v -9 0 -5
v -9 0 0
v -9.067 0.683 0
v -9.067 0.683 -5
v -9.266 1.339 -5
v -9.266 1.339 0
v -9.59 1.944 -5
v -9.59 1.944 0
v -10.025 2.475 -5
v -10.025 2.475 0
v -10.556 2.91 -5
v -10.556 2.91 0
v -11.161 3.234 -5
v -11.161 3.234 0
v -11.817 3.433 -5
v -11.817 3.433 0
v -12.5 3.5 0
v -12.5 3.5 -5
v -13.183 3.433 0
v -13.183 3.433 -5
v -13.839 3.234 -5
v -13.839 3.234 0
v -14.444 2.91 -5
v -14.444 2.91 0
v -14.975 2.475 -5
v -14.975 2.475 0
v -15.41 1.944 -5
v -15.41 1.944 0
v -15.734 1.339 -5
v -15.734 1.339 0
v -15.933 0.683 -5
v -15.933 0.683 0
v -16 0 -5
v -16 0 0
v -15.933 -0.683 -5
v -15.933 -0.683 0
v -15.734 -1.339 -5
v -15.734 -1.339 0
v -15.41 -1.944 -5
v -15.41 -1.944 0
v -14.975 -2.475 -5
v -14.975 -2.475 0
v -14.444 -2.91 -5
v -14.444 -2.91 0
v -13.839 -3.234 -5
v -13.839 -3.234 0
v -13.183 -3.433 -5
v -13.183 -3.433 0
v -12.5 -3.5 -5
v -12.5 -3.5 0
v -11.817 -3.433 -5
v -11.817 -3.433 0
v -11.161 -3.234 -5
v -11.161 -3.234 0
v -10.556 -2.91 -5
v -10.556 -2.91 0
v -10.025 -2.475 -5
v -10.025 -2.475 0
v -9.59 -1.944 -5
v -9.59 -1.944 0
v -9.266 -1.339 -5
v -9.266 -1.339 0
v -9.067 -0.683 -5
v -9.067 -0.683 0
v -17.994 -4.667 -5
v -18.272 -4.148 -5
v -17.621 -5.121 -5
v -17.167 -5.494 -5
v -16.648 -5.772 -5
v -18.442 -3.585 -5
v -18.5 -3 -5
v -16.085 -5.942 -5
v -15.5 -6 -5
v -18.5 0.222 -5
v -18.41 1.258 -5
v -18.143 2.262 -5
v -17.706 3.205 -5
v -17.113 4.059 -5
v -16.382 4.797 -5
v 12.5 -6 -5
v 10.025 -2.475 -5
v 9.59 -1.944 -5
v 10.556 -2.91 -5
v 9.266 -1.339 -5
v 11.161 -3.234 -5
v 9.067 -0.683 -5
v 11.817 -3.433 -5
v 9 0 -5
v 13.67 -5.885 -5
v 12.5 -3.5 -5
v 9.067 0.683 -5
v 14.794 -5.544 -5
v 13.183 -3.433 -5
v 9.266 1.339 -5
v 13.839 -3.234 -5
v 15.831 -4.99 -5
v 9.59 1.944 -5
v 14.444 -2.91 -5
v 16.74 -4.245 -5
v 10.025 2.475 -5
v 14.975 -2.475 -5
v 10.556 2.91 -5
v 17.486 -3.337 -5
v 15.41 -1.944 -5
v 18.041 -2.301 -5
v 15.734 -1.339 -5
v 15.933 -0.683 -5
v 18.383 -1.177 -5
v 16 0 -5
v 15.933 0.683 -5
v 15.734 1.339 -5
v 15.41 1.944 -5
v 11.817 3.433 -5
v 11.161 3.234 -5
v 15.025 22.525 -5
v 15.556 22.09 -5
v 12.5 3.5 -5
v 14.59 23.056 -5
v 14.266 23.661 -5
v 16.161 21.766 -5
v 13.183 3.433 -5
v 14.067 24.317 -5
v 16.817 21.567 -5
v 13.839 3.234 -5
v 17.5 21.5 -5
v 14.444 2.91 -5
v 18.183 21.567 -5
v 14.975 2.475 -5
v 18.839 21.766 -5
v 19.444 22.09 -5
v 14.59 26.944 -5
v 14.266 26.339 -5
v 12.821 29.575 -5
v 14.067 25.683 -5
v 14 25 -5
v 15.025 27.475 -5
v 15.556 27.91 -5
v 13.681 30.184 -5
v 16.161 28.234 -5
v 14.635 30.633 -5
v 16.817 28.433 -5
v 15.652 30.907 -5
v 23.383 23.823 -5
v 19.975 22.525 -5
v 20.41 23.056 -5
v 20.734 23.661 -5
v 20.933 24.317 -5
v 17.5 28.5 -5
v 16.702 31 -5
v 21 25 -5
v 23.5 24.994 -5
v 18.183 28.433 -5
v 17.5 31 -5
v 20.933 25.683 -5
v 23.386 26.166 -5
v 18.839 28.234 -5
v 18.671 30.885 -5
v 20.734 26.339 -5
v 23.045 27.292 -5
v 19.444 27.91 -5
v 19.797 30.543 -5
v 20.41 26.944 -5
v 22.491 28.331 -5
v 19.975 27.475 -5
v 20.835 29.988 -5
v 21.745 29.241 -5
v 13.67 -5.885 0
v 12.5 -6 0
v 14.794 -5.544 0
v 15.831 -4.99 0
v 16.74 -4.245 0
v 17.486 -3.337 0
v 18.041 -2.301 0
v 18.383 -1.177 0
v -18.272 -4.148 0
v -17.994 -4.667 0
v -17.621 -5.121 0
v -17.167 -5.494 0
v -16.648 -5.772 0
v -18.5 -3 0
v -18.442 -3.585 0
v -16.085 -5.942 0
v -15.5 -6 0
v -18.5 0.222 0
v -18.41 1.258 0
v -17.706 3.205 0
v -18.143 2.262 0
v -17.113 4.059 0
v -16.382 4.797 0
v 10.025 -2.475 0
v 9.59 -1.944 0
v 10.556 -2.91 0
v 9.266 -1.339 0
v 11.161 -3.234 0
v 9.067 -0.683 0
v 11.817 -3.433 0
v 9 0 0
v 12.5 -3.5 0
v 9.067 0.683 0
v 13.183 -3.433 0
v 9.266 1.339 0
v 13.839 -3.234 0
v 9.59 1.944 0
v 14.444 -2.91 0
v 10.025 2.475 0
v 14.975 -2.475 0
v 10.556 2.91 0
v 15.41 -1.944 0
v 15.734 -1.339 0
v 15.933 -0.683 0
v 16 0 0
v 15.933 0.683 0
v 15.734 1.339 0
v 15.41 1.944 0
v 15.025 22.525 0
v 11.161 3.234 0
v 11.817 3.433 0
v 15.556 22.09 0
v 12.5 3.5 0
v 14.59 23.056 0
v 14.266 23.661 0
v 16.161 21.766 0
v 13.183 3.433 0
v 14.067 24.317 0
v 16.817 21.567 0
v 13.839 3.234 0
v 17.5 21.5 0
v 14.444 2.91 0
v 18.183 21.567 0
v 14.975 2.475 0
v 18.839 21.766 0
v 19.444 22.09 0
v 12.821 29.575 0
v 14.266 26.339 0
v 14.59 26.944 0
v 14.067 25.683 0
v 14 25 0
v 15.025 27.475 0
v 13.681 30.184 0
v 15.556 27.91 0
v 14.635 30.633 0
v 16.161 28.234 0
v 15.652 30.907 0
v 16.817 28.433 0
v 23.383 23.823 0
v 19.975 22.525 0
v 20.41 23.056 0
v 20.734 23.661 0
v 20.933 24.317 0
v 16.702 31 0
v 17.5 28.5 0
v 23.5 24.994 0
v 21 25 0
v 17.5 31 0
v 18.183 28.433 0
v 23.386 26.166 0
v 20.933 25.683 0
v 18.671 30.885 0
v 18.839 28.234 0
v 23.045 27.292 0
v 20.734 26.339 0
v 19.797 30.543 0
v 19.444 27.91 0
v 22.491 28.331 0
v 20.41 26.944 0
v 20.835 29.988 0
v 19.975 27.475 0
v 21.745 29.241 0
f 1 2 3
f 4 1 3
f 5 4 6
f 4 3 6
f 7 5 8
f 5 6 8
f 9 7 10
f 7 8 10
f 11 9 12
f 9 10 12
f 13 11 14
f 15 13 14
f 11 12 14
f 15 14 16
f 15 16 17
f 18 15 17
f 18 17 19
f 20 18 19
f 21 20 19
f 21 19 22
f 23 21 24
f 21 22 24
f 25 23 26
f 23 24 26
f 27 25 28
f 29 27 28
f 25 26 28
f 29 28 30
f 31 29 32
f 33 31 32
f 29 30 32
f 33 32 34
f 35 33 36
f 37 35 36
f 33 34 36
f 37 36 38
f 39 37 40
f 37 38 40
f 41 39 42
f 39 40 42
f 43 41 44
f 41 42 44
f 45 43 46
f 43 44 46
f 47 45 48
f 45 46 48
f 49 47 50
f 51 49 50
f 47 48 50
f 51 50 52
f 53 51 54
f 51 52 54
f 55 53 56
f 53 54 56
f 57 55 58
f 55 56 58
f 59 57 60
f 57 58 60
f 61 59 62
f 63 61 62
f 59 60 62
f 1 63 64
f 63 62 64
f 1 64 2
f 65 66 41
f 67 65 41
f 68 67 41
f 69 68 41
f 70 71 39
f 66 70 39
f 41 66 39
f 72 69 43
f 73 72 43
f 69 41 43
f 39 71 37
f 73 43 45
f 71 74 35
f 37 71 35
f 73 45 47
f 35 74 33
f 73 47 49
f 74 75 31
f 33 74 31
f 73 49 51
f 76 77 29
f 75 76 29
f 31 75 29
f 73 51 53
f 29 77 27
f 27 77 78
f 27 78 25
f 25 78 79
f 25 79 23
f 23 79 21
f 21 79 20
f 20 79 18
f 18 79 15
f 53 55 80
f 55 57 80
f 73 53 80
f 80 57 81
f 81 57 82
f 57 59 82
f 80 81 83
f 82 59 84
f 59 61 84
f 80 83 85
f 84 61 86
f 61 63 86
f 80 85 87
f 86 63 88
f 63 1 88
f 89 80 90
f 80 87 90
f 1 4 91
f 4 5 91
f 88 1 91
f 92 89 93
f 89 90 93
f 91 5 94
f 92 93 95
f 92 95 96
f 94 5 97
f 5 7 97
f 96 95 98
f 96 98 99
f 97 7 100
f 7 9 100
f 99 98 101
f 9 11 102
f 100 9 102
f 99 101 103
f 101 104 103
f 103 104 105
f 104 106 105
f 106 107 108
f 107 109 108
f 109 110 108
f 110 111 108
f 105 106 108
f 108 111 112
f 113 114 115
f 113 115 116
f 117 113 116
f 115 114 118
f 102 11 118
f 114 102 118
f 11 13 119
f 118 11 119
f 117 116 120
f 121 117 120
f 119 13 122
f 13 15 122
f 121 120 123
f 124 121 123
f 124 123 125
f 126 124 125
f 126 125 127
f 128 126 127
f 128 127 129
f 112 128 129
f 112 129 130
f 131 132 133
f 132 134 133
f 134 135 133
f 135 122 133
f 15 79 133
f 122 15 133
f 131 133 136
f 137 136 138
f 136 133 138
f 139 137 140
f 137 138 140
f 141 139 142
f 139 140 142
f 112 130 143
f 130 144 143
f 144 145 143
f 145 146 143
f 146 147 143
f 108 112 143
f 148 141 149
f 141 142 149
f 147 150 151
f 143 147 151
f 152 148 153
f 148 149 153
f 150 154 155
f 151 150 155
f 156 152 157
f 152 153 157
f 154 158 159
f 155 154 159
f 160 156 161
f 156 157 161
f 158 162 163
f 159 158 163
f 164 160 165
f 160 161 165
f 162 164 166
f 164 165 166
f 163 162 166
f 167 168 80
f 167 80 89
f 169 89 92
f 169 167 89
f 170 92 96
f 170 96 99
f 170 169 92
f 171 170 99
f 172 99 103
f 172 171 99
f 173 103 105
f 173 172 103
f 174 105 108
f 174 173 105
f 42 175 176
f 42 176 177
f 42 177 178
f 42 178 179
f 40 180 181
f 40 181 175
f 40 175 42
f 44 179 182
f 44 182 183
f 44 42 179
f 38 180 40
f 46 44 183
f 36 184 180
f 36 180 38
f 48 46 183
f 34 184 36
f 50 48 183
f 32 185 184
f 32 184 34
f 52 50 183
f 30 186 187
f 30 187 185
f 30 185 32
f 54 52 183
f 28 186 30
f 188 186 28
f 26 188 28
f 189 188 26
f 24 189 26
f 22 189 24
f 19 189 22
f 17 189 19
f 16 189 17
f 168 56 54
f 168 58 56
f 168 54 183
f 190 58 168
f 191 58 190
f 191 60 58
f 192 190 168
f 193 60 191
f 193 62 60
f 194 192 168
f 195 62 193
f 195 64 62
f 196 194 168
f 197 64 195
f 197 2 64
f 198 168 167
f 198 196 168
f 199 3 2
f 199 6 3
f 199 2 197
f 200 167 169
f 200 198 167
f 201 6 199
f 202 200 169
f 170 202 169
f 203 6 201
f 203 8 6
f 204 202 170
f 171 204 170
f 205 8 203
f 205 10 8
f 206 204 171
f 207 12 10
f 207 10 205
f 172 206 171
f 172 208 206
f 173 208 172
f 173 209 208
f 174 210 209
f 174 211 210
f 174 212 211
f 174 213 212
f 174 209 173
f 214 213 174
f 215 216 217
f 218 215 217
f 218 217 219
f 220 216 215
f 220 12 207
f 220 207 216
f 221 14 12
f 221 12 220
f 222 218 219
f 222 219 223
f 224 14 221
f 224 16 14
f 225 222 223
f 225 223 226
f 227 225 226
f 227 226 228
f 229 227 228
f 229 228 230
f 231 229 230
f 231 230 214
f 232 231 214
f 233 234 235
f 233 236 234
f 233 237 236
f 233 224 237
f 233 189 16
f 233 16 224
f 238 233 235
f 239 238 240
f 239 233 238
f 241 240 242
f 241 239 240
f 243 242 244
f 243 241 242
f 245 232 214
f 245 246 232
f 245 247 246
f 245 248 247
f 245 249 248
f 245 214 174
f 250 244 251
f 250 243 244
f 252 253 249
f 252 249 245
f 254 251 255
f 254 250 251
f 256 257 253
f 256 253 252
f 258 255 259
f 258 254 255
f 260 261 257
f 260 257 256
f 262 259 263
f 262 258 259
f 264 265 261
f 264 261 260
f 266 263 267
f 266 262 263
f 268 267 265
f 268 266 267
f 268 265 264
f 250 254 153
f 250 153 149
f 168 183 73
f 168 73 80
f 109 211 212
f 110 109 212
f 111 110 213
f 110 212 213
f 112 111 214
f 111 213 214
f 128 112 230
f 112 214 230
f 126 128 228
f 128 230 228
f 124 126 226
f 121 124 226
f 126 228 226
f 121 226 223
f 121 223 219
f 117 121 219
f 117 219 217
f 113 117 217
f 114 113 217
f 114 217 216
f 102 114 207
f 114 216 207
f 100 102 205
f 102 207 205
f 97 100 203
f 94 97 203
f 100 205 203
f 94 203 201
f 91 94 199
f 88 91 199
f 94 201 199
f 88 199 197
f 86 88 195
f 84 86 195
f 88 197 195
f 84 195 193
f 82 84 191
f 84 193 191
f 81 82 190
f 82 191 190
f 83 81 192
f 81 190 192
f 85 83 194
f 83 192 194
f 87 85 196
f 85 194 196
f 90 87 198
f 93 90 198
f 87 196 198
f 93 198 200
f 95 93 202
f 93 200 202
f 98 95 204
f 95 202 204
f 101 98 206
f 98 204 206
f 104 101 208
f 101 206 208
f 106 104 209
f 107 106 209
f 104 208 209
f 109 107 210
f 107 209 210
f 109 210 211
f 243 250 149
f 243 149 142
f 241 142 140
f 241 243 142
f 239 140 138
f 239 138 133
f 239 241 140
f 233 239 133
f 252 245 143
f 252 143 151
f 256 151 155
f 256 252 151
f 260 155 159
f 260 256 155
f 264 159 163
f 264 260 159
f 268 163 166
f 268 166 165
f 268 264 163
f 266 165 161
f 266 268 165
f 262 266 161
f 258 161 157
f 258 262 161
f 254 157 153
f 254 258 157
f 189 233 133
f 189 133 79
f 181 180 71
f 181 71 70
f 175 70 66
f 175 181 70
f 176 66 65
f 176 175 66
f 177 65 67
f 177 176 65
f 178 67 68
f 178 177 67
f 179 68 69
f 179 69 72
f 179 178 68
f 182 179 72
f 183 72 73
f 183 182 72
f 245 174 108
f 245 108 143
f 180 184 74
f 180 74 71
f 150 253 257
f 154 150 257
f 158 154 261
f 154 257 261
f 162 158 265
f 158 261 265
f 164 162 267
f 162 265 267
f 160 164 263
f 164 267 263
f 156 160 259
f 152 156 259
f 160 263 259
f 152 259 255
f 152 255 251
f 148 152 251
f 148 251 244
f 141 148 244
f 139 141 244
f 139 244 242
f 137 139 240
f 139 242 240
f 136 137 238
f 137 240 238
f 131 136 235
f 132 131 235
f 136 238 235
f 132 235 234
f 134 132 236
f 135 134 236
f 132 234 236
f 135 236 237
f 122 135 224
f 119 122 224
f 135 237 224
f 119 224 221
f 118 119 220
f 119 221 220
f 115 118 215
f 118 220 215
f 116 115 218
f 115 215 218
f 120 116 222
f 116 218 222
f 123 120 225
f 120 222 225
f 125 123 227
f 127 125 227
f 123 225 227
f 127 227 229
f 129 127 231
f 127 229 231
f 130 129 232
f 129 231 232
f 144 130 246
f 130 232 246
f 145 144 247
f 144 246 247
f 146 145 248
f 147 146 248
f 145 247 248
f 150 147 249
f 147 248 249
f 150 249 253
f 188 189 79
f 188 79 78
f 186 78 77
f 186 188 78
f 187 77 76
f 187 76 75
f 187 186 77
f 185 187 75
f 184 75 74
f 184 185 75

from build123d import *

# Parameters (mm, degrees)
SKETCH1_R          = 3.5
BASE_FLANGE1_DEPTH = 5


# Sheet-metal steps are written as plain solids
with BuildPart() as part:
    # Sketch1 → Base-Flange1 (new body)
    with BuildSketch(Plane.XY):
        with BuildLine():
            Line((-15.5, -6), (12.5, -6))
            ThreePointArc((12.5, -6), (16.303933434, -4.640052848), (18.383484054, -1.176696811))
            Line((18.383484054, -1.176696811), (23.383484054, 23.823303189))
            ThreePointArc((23.383484054, 23.823303189), (22.140052848, 28.803933434), (17.5, 31))
            Line((17.5, 31), (16.702465004, 31))
            ThreePointArc((16.702465004, 31), (14.634897456, 30.632509604), (12.820600314, 29.575054812))
            Line((12.820600314, 29.575054812), (-16.381864689, 4.797205718))
            ThreePointArc((-16.381864689, 4.797205718), (-17.944776769, 2.742945609), (-18.5, 0.222150906))
            Line((-18.5, 0.222150906), (-18.5, -3))
            ThreePointArc((-18.5, -3), (-17.621320344, -5.121320344), (-15.5, -6))
        make_face()
        with Locations((17.5, 25)):
            Circle(SKETCH1_R, mode=Mode.SUBTRACT)
        with Locations((12.5, 0)):
            Circle(SKETCH1_R, mode=Mode.SUBTRACT)
        with Locations((-12.5, 0)):
            Circle(SKETCH1_R, mode=Mode.SUBTRACT)
    extrude(amount=-BASE_FLANGE1_DEPTH)


solid = part.part
